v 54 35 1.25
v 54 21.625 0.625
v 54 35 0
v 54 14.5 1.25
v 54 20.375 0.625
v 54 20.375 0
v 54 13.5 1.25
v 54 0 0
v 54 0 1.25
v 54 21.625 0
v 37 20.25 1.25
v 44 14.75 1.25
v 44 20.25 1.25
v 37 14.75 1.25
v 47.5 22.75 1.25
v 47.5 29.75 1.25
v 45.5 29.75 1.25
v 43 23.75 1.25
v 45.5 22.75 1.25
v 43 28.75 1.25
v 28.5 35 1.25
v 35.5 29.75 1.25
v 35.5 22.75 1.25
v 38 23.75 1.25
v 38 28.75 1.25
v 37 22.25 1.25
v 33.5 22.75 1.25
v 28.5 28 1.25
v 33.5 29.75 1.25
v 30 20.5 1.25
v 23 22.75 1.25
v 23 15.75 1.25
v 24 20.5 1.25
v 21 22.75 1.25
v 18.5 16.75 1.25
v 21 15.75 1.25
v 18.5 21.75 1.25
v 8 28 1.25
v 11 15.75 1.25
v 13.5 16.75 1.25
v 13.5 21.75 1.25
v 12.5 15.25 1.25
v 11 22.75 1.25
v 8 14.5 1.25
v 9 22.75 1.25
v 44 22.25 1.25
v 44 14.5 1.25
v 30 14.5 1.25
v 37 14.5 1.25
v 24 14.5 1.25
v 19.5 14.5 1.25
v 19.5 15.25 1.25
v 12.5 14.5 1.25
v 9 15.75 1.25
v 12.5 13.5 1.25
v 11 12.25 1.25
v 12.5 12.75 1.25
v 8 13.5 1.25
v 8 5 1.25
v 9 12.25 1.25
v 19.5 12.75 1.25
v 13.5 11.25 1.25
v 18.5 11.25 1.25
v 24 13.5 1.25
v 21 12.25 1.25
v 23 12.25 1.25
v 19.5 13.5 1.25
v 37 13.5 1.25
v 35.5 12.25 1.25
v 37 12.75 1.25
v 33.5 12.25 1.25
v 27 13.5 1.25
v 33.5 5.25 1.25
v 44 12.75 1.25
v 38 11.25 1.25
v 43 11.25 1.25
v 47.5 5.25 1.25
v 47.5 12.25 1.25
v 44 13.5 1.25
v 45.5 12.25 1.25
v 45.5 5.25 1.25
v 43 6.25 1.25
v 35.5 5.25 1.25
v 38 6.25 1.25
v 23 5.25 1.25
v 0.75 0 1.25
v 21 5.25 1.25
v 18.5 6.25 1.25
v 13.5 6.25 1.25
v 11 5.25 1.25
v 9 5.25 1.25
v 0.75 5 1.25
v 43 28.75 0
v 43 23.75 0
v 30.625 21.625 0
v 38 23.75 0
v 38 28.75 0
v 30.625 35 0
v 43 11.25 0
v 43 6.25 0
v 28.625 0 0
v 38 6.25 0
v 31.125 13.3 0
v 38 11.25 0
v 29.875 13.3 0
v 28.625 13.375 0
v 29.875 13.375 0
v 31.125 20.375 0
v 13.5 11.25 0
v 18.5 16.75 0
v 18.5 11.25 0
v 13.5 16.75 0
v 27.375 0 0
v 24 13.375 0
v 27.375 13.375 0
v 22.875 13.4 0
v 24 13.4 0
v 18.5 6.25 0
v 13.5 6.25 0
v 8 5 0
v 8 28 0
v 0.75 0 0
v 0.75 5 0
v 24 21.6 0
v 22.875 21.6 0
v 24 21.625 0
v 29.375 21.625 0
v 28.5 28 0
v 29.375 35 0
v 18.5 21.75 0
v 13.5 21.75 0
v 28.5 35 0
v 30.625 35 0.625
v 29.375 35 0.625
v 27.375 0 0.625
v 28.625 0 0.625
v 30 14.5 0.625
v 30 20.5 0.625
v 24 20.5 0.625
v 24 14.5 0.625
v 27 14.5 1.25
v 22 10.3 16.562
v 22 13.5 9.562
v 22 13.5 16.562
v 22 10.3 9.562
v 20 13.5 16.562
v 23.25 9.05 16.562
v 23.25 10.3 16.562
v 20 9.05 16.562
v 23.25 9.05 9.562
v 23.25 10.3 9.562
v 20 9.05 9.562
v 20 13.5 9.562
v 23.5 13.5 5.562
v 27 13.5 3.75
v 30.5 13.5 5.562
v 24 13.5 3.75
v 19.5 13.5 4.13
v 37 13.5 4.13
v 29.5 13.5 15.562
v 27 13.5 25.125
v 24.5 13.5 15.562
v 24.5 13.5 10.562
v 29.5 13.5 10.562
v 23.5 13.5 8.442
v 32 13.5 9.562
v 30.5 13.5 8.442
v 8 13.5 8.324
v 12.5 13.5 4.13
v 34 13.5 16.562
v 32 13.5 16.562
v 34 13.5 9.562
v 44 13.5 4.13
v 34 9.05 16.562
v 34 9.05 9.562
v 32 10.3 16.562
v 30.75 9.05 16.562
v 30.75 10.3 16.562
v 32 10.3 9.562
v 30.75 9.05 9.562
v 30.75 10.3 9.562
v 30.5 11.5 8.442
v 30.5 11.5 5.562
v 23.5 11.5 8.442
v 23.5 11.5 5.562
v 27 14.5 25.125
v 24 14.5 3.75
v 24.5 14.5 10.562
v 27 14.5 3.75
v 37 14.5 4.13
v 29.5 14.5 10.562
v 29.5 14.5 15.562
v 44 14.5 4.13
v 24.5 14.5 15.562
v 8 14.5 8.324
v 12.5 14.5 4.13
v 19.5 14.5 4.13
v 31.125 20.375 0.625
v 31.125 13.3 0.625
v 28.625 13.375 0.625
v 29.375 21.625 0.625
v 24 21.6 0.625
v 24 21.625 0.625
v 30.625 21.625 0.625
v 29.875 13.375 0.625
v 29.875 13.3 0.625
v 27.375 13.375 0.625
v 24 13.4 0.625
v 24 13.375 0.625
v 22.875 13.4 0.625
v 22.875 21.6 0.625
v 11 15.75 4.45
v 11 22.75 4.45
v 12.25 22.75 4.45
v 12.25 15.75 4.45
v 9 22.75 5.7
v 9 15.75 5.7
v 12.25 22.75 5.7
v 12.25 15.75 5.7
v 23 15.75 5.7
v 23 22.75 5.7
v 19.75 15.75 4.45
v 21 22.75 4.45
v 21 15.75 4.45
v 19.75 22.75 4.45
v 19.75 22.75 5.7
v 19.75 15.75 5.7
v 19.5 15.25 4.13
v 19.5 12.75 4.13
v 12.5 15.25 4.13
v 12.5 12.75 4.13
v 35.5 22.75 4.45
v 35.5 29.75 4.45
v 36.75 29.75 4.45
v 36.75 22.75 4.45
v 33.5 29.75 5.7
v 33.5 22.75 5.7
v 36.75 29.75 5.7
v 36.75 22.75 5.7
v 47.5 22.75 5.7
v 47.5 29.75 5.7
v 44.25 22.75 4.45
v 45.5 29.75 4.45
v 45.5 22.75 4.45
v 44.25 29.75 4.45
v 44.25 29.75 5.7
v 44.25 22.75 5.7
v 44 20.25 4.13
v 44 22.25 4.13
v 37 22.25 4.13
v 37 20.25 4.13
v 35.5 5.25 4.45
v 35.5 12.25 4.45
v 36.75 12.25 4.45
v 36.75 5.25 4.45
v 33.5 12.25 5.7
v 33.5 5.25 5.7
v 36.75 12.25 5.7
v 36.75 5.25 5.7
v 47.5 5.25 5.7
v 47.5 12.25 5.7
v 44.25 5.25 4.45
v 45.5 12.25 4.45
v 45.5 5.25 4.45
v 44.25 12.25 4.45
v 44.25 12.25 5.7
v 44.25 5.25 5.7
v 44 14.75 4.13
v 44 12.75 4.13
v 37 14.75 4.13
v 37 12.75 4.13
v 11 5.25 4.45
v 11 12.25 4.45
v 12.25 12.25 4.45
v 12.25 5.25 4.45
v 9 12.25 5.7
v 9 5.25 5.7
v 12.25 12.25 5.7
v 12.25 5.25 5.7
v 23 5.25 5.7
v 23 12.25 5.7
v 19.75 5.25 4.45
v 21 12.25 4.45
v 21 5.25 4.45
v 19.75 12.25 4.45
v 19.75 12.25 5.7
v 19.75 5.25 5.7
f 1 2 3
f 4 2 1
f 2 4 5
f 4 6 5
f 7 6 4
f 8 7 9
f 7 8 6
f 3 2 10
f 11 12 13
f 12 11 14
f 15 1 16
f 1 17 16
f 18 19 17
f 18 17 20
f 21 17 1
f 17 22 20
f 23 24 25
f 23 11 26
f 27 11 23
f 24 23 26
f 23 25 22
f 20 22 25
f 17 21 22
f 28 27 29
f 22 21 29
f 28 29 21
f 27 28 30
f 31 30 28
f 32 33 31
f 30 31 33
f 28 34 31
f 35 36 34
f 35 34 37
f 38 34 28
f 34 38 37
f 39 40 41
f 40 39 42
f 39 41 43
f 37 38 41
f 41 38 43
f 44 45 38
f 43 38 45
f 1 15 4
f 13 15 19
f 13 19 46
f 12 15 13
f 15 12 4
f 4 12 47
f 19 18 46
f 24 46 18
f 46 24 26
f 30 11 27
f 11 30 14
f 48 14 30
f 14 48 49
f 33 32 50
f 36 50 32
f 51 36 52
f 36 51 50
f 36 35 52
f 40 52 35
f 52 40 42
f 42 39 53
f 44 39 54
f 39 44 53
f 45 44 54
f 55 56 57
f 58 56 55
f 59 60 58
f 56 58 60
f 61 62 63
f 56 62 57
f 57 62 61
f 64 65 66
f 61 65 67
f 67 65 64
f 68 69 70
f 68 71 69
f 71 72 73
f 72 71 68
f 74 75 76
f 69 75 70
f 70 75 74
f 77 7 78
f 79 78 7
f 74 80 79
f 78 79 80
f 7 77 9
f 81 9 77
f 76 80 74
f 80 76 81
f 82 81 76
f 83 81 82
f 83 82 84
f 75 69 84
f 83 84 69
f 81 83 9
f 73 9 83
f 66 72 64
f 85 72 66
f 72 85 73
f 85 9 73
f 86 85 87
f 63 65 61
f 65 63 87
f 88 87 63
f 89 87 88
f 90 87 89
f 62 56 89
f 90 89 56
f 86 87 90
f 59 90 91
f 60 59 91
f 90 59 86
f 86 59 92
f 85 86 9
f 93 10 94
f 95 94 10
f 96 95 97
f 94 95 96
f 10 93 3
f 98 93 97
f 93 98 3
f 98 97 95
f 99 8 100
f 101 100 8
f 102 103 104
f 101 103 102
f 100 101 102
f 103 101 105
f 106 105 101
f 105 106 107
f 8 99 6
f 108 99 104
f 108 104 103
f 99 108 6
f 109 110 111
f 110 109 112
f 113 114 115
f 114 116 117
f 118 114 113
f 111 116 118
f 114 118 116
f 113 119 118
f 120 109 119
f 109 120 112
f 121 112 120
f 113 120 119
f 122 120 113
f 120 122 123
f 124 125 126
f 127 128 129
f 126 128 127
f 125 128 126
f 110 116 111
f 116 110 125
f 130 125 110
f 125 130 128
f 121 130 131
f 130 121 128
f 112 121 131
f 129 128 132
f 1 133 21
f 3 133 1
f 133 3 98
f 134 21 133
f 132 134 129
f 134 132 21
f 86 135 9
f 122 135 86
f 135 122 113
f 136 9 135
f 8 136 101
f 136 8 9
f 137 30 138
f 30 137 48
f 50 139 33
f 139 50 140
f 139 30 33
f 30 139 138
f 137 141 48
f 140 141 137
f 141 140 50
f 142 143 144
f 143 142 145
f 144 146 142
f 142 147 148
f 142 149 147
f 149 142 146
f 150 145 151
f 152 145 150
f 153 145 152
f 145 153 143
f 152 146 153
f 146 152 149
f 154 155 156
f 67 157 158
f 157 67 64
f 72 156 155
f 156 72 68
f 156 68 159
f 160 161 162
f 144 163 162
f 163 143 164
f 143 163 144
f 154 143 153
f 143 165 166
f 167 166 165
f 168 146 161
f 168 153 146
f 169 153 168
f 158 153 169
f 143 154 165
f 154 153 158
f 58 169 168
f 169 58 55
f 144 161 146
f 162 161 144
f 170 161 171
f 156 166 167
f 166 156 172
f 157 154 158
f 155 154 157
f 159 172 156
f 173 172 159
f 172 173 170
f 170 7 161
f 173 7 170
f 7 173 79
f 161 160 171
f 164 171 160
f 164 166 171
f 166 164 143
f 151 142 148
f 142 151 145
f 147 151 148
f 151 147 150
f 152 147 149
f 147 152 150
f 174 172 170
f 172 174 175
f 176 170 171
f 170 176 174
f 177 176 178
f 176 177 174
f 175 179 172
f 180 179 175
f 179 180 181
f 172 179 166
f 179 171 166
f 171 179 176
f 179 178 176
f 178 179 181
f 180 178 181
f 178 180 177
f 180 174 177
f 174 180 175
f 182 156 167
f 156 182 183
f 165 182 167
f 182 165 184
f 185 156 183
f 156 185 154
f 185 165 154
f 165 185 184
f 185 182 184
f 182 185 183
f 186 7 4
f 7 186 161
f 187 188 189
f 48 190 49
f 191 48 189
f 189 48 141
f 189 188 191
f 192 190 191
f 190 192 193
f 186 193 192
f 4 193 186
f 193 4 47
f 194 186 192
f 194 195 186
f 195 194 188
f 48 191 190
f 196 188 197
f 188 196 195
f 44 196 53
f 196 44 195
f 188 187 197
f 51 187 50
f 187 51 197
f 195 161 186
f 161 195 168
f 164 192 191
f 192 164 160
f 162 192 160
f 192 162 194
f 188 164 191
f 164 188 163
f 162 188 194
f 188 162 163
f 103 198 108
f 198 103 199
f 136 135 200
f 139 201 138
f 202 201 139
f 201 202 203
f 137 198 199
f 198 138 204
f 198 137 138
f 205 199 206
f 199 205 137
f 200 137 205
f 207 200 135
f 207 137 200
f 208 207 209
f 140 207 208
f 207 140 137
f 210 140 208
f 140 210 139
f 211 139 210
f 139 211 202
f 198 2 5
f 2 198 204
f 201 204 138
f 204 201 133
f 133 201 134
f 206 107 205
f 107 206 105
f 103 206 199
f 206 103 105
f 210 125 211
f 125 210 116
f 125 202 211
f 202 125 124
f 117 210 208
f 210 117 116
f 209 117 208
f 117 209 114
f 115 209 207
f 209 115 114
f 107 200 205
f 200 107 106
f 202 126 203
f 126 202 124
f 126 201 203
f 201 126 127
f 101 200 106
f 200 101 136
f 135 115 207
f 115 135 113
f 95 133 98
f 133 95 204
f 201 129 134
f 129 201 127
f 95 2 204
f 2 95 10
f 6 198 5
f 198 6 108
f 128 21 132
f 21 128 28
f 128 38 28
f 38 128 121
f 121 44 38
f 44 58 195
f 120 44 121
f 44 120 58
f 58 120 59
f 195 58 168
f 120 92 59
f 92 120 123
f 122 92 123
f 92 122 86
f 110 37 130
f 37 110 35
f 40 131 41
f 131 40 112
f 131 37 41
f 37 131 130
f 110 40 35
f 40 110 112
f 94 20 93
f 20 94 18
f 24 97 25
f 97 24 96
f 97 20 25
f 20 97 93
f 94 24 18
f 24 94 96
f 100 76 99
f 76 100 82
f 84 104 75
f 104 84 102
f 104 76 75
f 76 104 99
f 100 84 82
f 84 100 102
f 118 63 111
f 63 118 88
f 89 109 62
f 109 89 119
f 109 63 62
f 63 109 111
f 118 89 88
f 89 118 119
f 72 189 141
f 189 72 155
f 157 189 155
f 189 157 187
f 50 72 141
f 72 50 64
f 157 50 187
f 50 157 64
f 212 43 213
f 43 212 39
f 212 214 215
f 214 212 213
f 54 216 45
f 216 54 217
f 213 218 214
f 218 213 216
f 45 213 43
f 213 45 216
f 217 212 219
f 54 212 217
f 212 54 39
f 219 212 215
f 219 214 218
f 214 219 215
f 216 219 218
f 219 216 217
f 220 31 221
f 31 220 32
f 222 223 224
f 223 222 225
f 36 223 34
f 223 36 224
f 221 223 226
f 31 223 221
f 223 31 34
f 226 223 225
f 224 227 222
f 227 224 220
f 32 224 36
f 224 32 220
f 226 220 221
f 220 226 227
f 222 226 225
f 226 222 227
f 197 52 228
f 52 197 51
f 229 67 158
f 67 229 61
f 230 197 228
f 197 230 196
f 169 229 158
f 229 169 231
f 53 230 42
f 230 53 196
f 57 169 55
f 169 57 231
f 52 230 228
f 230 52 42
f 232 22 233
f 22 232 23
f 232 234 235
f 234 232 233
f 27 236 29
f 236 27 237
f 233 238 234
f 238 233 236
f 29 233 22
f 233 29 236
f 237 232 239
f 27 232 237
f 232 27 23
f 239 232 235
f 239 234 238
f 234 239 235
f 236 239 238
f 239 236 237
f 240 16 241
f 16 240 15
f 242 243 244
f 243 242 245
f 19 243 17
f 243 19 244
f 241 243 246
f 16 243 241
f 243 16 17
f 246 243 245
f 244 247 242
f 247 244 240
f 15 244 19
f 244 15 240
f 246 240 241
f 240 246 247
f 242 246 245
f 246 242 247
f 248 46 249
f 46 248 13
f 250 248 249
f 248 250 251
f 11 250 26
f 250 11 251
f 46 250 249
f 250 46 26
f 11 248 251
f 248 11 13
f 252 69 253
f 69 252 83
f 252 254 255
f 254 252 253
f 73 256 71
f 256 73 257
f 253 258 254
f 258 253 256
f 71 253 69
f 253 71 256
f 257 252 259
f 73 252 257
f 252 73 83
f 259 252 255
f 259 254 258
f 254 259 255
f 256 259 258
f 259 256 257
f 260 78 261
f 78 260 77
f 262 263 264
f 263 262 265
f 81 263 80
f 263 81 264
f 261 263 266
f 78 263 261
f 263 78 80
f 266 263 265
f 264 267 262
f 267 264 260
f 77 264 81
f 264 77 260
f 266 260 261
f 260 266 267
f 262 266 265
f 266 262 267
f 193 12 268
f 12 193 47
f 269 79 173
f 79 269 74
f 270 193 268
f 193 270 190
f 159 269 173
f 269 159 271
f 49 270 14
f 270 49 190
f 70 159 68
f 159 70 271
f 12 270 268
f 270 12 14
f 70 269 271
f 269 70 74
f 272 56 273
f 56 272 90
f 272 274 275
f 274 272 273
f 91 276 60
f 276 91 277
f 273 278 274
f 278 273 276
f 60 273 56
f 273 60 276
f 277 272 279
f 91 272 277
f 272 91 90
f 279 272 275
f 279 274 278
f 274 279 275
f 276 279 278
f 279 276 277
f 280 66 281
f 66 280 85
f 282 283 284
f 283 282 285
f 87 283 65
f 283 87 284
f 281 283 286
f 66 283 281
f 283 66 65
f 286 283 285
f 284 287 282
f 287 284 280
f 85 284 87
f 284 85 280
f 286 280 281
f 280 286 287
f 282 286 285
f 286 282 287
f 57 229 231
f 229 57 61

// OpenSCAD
/*
Projekt Name: Trennwaende fuer das Modellhaus 3723
Modul:  Zwischendecke mit Halterungen fuer die WS2812
Projekt URL: https://github.com/Hardi-St/MobaLedLib_Docu/tree/master/3D_Daten_fuer_die_MobaLedLib/Trennwaende%20fuer%20Haeuser
Version: 0.0.1
Autor: Moba-Nick (mobanick@wp12085804.server-he.de)
Lizenz: CC-BY-SA-4.0 (https://creativecommons.org/licenses/by-sa/4.0/legalcode.de)
*/
// Alle Angaben sind immer in mm bei meinen Projekten.
//Parameter fuer die Grundplatte des Hauses
x_grund = 54;       // Laenge der Grundplatte
y_grund = 35;       // Breite der Grundplatte 
z_grund = 1.25;       // Staerke der Zwischendecke
wand_staerke = 1.00; // Parameter fuer die Staerke der Waende

z_zwischendecke = z_grund * 0.5; // Hoehe der Fugen
faktor_fugen = 1.25; //Faktor um den die Fugen breiter sind als die Wandstaerke
fugen_erstellen = true; // Sollen Fugen fuer das verkleben erstellt (true) oder keine Fugen erstellt (false) werden?

/*
    Bitte die nachfolgenden Zeilen nicht aendern. Diese errechnen die zusaetzlichen Parameter aus den vorhandenen Werten und legen die Abmessungen fuer die LED-Halterungen fest.
*/
x_all = x_grund; 
y_all = y_grund; 
z_all = 55 - 28 - z_grund - wand_staerke*0.625; // Gesamthoehe vom Haus - Hoehe_Erdgeschoss (Grundplatte_Haus.scad) - Hoehe Zwischendecke - Dachschraegenkompensierung
z_knie = 0; //Kniestock nicht vorhanden

// Variablen zu den LEDs und deren Halterung
led_x = 10; // Laenge der LED inkl. Platine
led_y = 10; // Breite der LED inkl. Platine
led_x_inner = 5; // Laenge der LED ohne Platine
led_y_inner = 5; // Breite der LEd ohne Platine
led_h_z = 3.2; // Abstand zwischen Grundplatte und LED-Haken 
led_h_x = 7; // Laenge des LED-Halters
led_h_y = 2; // Breite des LED-Halters
haken = 1.25; // BReite des Ueberhanges des LED-Halters

// Angaben fuer die Groesse der Kabeloeffnungen in den Waenden. setzen der Werte auf 0 deaktivieren die Funktion
kabel_x = 2.5;
kabel_y = 3.00;

/* 
    Wenn die Zwischendecke_Haus eine Oeffnung braucht, kann man hier einen Ausschnitt in der Zwischendecke_Haus dafuer vorsehen und die Position und Groesse angeben.
*/
x_cut = 6;  // Laenge der Aussparung
y_cut = 6;  // Breite der Aussparung
cut_pos_x = x_grund/2 - x_cut/2; // Punkt X der Aussparung
cut_pos_y = y_all/2 - y_cut/2; // Punkt Y der Aussparung 

/*
    Im nachfolgendem Abschnitt wird die Grundplatte und alle Waende erstellt.
    Die Angaben koennen ganz nach belieben abgeaendert werden.
*/
difference(){
    //Erstellen der Zwischendecke sowie dem Loch fuer den Kabelschacht (true = mit loch, false = ohne Loch)
    union(){
        Zwischendecke_Haus(true);
        DachSchraege_Y_Wand(0,y_grund/2-y_cut/2-wand_staerke,z_grund,x_grund,z_all,true);
    }
    if (fugen_erstellen == true){
         //Kabelschacht
        // rechts
        Wand_DIR_X(x_grund/2+x_cut/2+wand_staerke/2,y_grund/2-y_cut/2-wand_staerke-0.2,0,x_cut+wand_staerke*2,z_zwischendecke,faktor_fugen);
        //links
        Wand_DIR_X(x_grund/2-x_cut/2-wand_staerke/2,y_grund/2-y_cut/2-wand_staerke-0.1,0,x_cut+wand_staerke*2+0.2,z_zwischendecke,faktor_fugen);
        //vorne
        Wand_DIR_Y(x_grund/2-x_cut/2,y_grund/2-y_cut/2-wand_staerke/2,0,y_cut,z_zwischendecke,faktor_fugen);
        //hinten
        Wand_DIR_Y(x_grund/2-x_cut/2,y_grund/2+y_cut/2+wand_staerke/2,0,y_cut,z_zwischendecke,faktor_fugen);
        
        // Wand vorne bis Mitte
        Wand_DIR_X(x_grund/2+wand_staerke, 0,0,y_grund/2-y_cut/2,z_zwischendecke,faktor_fugen); 

        // Wand Mitte bis Hinten
        Wand_DIR_X(x_grund/2+3, y_grund/2+y_cut/2,0,y_grund/2-y_cut/2,z_zwischendecke,faktor_fugen);

        //Wand Mitte bis Rechts
        Wand_DIR_Y(x_grund/2+x_cut/2+wand_staerke/2,y_grund/2+y_cut/2+wand_staerke/2,0,x_grund/2-x_cut/2-wand_staerke/2,z_zwischendecke,faktor_fugen);
    }
    // Ausschnitt oben
    translate([0,y_all-7,0]){
        cube([x_grund/2+1.5,7,z_all],false);
    }
    // Ausschnitt links
    translate([0,5,0]){
        cube([8,y_all,z_all],false);
    }
        // Kappung um 1mm wegen Länge links
    translate([0,0,0]){
        cube([0.75,8,z_all],false);
    }
    // Oben Links Tuer/Schafenster 1
    LED_Loch(16, y_all*0.55); 
    // Oben Rechts Dunkelkammer
    LED_Loch(x_all*0.75, y_all*0.75); 
    // Unten Rechts Lager
    LED_Loch(x_all*0.75, y_all*0.25); 
    // Unten Links Tuer/Schafenster 2
    LED_Loch(16, y_all*0.25); 
  
    Kabel_Loch(x_grund/2-x_cut/2,y_grund/2-y_cut/2-wand_staerke);  
}

// Oben Links Tuer/Schafenster 1
LED_Halter_R(16, y_all*0.55,"unten");
// Oben Rechts Dunkelkammer
LED_Halter_R(x_all*0.75, y_all*0.75,"unten");
// Unten Rechts Lager
LED_Halter_R(x_all*0.75, y_all*0.25,"oben");
// Unten Links Tuer/Schafenster 2
LED_Halter_R(16, y_all*0.25,"oben"); 

/* 
!!!!!!!!!!!!!!!!!!!!!!!!!!!!!!!!!!!!!!!!!!!!!!!!!!!!!!!!!!!!!!!!!!!!   
!!!!    Ab hier kommen die Module. Bitte nur aendern wann man   !!!!
!!!!    weiss was man macht.                                    !!!!
!!!!!!!!!!!!!!!!!!!!!!!!!!!!!!!!!!!!!!!!!!!!!!!!!!!!!!!!!!!!!!!!!!!!
/*  
    Das Module Zwischendecke_Haus erstellt die Grundplatte des Hauses inkl. des Aussenrandes um die Grundplatte. Dazu wurde im Bereich fuer die Parameter in den  Zeilen 10 - 37 die Werte angeben.
*/
module Zwischendecke_Haus(cutting){
        difference(){
            cube([x_grund,y_grund,z_grund],false);
            // Auschnitt aus der Grundplatte vornehmen
            if (cutting == true){
                translate([cut_pos_x,cut_pos_y,0]){
                    cube([x_cut,y_cut,z_grund],false);
                }
            }
        }
}

/*
    Das Modul "Wand_DIR_X" erstellt Waende welche auf der X-Achse (von links nach rechts) verschoben werden koennen.
    pos_x   => gibt den pospunkt auf der X-Achse an.
    pos_y   => gibt den pospunkt auf der Y-Achse an.
    pos_z   => gibt den pospunkt auf der Z-Achse an.
    width_y => gibt an wie lang die Wand werden soll.
    height  => gibt die Hoehe der Wand an.
*/
module Wand_DIR_X(pos_x, pos_y, pos_z,width_x, height, faktor){
    translate([pos_x -wand_staerke*faktor/2,pos_y,pos_z]){
        cube([wand_staerke*faktor,width_x, height]);
    }
}

/*
    Das Modul "Wand_DIR_Y" erstellt Waende welche auf der Y-Achse (von vorne nach hinten) verschoben werden koennen.  
    pos_x   => gibt den pospunkt auf der X-Achse an.
    pos_y   => gibt den pospunkt auf der Y-Achse an.
    pos_z   => gibt den pospunkt auf der Z-Achse an.
    width_y => gibt an wie lang die Wand werden soll.
    height  => gibt die Hoehe der Wand an.
*/
module Wand_DIR_Y(pos_x, pos_y, pos_z,width_y,height, faktor){
    translate([pos_x,pos_y - wand_staerke*faktor/2,pos_z]){
        cube([width_y,wand_staerke*faktor, height]);
    }
}

/*
    Das Modul "LED_Loch" erstellt die Oeffnungen fuer die LEDs, damit das Licht durch die Zwischendecke in den zu beleuchtenden Raum kommt.
    pos_x   => gibt den Mittelpunkt der Oeffnung auf der X-Achse an.
    pos_y   => gibt den Mittelpunkt der Oeffnung auf der Y-Achse an.
*/
module LED_Loch(pos_x, pos_y){
    translate([pos_x - led_x_inner/2,pos_y - led_y_inner/2,0]){
        cube([led_x_inner,led_y_inner, z_grund], center=false);
    }
}

/*
    Das Modul "LED_Halter" erstellt die Halterungen fuer die LEDs.
    pos_x   => gibt den Mittelpunkt der LED auf der X-Achse an.
    pos_y   => gibt den Mittelpunkt der LED auf der Y-Achse an.
    posh    => bestimmt ob der der Einschubbegrenzer links oder rechts aus sicht der LED ist
*/
module LED_Halter(pos_x, pos_y,posh){
    translate([pos_x - led_h_x/2,pos_y - led_y/2 - led_y_inner / 2,z_grund]){
        cube([led_h_x,led_h_y,led_h_z], center=false);
    }
    translate([pos_x - led_h_x/2,pos_y - led_y/2 - led_y_inner / 2,z_grund+led_h_z]){
        cube([led_h_x,led_h_y+haken,z_grund], center=false);
    }
    translate([pos_x - led_h_x/2,pos_y + led_y/2,z_grund]){
        cube([led_h_x,led_h_y,led_h_z], center=false);
    }
    translate([pos_x - led_h_x/2,pos_y + led_y/2-haken,z_grund+led_h_z]){
        cube([led_h_x,led_h_y+haken,z_grund], center=false);
    }

    if (posh == "rechts"){
        translate([pos_x+led_x/2,pos_y-led_h_x/2,z_grund]){
            cube([led_h_y,led_h_x,led_h_z*0.9], center=false);
        }
    }else if (posh == "links"){
        translate([pos_x-led_x/2-led_h_y,pos_y-led_h_x/2,z_grund]){
            cube([led_h_y,led_h_x,led_h_z*0.9], center=false);
        }
    }else{
        // Kein Einschubbegrenzer
    }
}

/*
    Das Modul "LED_Halter_R" erstellt die Halterungen fuer die LEDs.
    pos_x   => gibt den Mittelpunkt der LED auf der X-Achse an.
    pos_y   => gibt den Mittelpunkt der LED auf der Y-Achse an.
    posh    => bestimmt ob der der Einschubbegrenzer oben oder unten aus sicht der LED ist
*/
module LED_Halter_R(pos_x, pos_y,posh){
        translate([pos_x - led_y/2-led_h_y,pos_y - led_h_y/2 - led_y_inner / 2,z_grund]){
            cube([led_h_y,led_h_x,led_h_z], center=false);
        }
        translate([pos_x - led_y/2-led_h_y,pos_y - led_h_y/2 - led_y_inner / 2,z_grund+led_h_z]){
            cube([led_h_y+haken,led_h_x,z_grund], center=false);
        }
        translate([pos_x + led_y/2,pos_y - led_h_y/2-led_y_inner / 2,z_grund]){
            cube([led_h_y,led_h_x,led_h_z], center=false);
        }
        translate([pos_x + led_y/2 - haken,pos_y - led_h_y/2-led_y_inner / 2,z_grund+led_h_z]){
            cube([led_h_y+haken,led_h_x,z_grund], center=false);
        }

        if (posh == "oben"){
            translate([pos_x-led_h_x/2,pos_y+led_y/2-led_h_y/2,z_grund]){
                cube([led_h_x,led_h_y,led_h_z*0.9], center=false);
            }
        }else{
            translate([pos_x-led_h_x/2,pos_y-led_y/2-led_h_y/2,z_grund]){
                cube([led_h_x,led_h_y,led_h_z*0.9], center=false);
            }
        }
}
/*
    Das Modul "LED_Halter_W" erstellt die Halterungen fuer die LEDs an der Mittelwand. Der Einschubbegrenzer ist dabei immer unten.
    pos_x   => gibt den Mittelpunkt der LED auf der X-Achse an.
    pos_y   => gibt den Mittelpunkt der LED auf der Y-Achse an.
    pos_z   => gibt den Mittelpunkt der LED auf der Z-Achse an.
*/
module LED_Halter_W(pos_x, pos_y,pos_z){
        translate([pos_x-led_x/2-led_h_y,pos_y-led_h_z,pos_z-led_h_y/2]){
            cube([led_h_y,led_h_z,led_h_x], center=false);
        }
        translate([pos_x-led_x/2-led_h_y,pos_y-led_h_z-z_grund,pos_z-led_h_y/2]){
            cube([led_h_y+haken,z_grund,led_h_x], center=false);
        }
        translate([pos_x+led_x/2,pos_y-led_h_z,pos_z-led_h_y/2]){
            cube([led_h_y,led_h_z,led_h_x], center=false);
        }
        translate([pos_x+led_x/2-haken,pos_y-led_h_z-z_grund,pos_z-led_h_y/2]){
            cube([led_h_y+haken,z_grund,led_h_x], center=false);
        }

        translate([pos_x-led_h_x/2, pos_y-led_h_y ,pos_z-led_y_inner]){
            cube([led_h_x,led_h_y,led_h_z*0.9], center=false);
        }
}

/*
    Das Modul "Kabel_Loch" erstellt die Oeffnungen fuer das durchfuehren der Kabel durch die Mittelwand. Die poshoehe ist dabei immer die Oberkante der Zwischendecke.
    pos_x   => gibt den Mittelpunkt der LED auf der X-Achse an.
    pos_y   => gibt den Mittelpunkt der LED auf der Y-Achse an.
*/
module Kabel_Loch(pos_x,pos_y){
    translate([pos_x,pos_y,z_grund]){
        cube([kabel_y,wand_staerke,kabel_x],false);
    }
}

/*
    Das Modul "DachSchraege" erstellt die Waende von der Aussenseite der Zwischendecke zur Mittelwand mit einer schraegen Decke und einem Kniestock.
     * Dachschraege(X,Y,Z,LED-Halterung,Pos,LED-Oeffnung,Kabeloeffnung);
     * X => posposition X-Achse
     * Y => posposition Y-Achse
     * Z => posposition Z-Achse
     * LED-Halterung => Soll die Wand eine Halterung fuer LEDs haben? => "links", "rechts", false 
     * Pos => Befindet sich die Dachschraege vor oder hinter der Mittelwand? => "vorne", "hinten"
     * LED-Oeffnung => Hat die Wand eine Oeffnung fuer eine LED? => true, false 
     * Kabel-Oeffnung => Soll die Wand eine Oeffnung fuer Kabel haben? Die Oeffnung ist immer an bei der Mittelwand. => true, false
*/
module DachSchraege(pos_x,pos_y,pos_z,pos_led,pos_wand,led_loch,kabel_loch){
    difference(){
        /* 
         *  BEGINN union()
        */
        union(){  
            /* 
             *  BEGINN KnieStock
            */
            translate([pos_x,pos_y,pos_z]){
                cube([wand_staerke,y_all/2,z_knie],false);
            }
            // ENDE KnieStock
            
            /* 
             *  BEGINN DachSchraege
             *  "vorne"  => Die Dachschraege beginnt Anfang der
             *  Zwischendecke und geht bis zur Mitte des Daches.
             *
             *  "hinten" => Die Dachschraege beginnt in der Mitte des Daches
             *  und geht bis zum Ende der Zwischendecke.
            */
            if (pos_wand == "vorne"){
                DachPunkte = [
                  [pos_x,pos_y,pos_z + z_knie],  //0
                  [pos_x + wand_staerke,pos_y,pos_z + z_knie],  //1
                  [pos_x + wand_staerke,pos_y + y_all/2,pos_z + z_knie],  //2
                  [pos_x,pos_y+y_all/2,pos_z + z_knie],  //3
                  [pos_x,pos_y+y_all/2,pos_z + z_all],  //4
                  [pos_x + wand_staerke,pos_y+y_all/2,pos_z + z_all]]; //5
                DachFlaechen = [
                    [0,1,2,3],//Boden
                    [5,4,3,2],//links
                    [0,4,5,1],//Oben
                    [5,1,0],//hinten
                    [5,2,1]];//vorne
                  
                polyhedron( DachPunkte, DachFlaechen );
            }else{
                DachPunkte = [
                  [pos_x,pos_y,pos_z + z_knie],  //0
                  [pos_x + wand_staerke,pos_y,pos_z + z_knie],  //1
                  [pos_x + wand_staerke,pos_y + y_all/2,pos_z + z_knie],  //2
                  [pos_x,pos_y+y_all/2,pos_z + z_knie],  //3
                  [pos_x,pos_y,pos_z + z_all],  //4
                  [pos_x + wand_staerke,pos_y,pos_z + z_all]]; //5
                DachFlaechen = [
                    [0,1,2,3],//Boden
                    [5,4,3,2],//links
                    [0,4,5,1],//Oben
                    [0,3,4],//hinten
                    [5,2,1]];//vorne
                  
                polyhedron( DachPunkte, DachFlaechen );
            }
            // ENDE DachSchraege
            
            /* BEGINN LED Halter an Dachschraege
            * Led_Halter_Dach(pos_x, pos_y,pos_z,dir)
            * Die pospunkte der X, Y und Z-Achse werden von den 
            * pospunkten der Wand automatisch berechnet und muessen nicht 
            * veraendert werden.
            * pos_x    => pospunkt X-Achse
            * pos_y    => pospunkt Y-Achse
            * pos_z    => pospunkt Z-Achse
            * dir      => Halterung an der linken oder rechten Seite der Wand
            */
            if (pos_led != false){
                if (pos_wand == "vorne"){
                    Led_Halter_Dach(pos_x,pos_y+y_all/2-led_y_inner-led_h_y,z_knie+led_x_inner/2,pos_led);
                }else{
                   Led_Halter_Dach(pos_x,pos_y+led_y_inner+led_h_y,z_knie+led_x_inner/2,pos_led);
                }
            }//ENDE LED Halter an Dachschraege
        }//Ende union()
        /*
         *  BEGINN difference()
         *  Alles was ab hier kommt wird aus den Flaechen oben ausgeschnitten
        */
        
        /*
        *   BEGINN LED_Loch 
        */
        if (led_loch == true){
            if (pos_wand == "vorne"){
                    translate([pos_x,pos_y+y_all/2-led_h_y-led_y/2-led_y_inner/2,z_knie+led_x_inner/2+led_h_y/2]){
                        cube([wand_staerke,led_y_inner,led_x_inner],false);
                    }
                }else{
                   translate([pos_x,pos_y+led_y_inner/2+led_h_z/2,z_knie+led_x_inner/2+led_h_y/2]){
                        cube([wand_staerke,led_y_inner,led_x_inner],false);
                    }
                }
        }
        //  ENDE LED_Loch
        
        /*
        *   BEGINN Kabel_Loch
        */
        if (kabel_loch == true){
            if (pos_wand == "vorne"){
                    translate([pos_x,pos_y+y_all/2-wand_staerke/2-kabel_y,z_grund]){
                        cube([wand_staerke,kabel_y,kabel_x],false);
                    }
                }else{
                   translate([pos_x,pos_y+wand_staerke/2,z_grund]){
                        cube([wand_staerke,kabel_y,kabel_x],false);
                    }
                }
        }
        //  ENDE Kabel_Loch
    }
}

/*
    Das Modul "LED_Halter_Dach" erstellt die Halterungen fuer die LEDs an der Mittelwand. Der Einschubbegrenzer ist dabei immer unten.
    pos_x   => gibt den Mittelpunkt der LED auf der X-Achse an.
    pos_y   => gibt den Mittelpunkt der LED auf der Y-Achse an.
    pos_z   => gibt den Mittelpunkt der LED auf der Z-Achse an.
    dir     => git an ob die Halterung links oder rechts von der Dachsraege ist.
*/
module Led_Halter_Dach(pos_x, pos_y,pos_z,dir){
    h_diff = 0;
    if (dir == "rechts"){
        translate([pos_x+wand_staerke,pos_y-led_x/2-led_h_y,pos_z]){
            cube([led_h_z-h_diff,led_h_y,led_h_x], center=false);
        }
        translate([pos_x+wand_staerke+led_h_z-h_diff,pos_y-led_x/2-led_h_y,pos_z]){
            cube([haken,led_h_y+haken,led_h_x], center=false);
        }
        
        translate([pos_x+wand_staerke,pos_y+led_x/2,pos_z]){
            cube([led_h_z-h_diff,led_h_y,led_h_x], center=false);
        }
        translate([pos_x+wand_staerke+led_h_z-h_diff,pos_y+led_x/2-haken,pos_z]){
            cube([haken,led_h_y+haken,led_h_x], center=false);
        }
        translate([pos_x+wand_staerke,pos_y-led_h_x/2,pos_z-led_h_x/2]){
            cube([led_h_y*0.9,led_h_x,led_h_y], center=false);
        }
    }else{
        translate([pos_x-led_h_z+h_diff,pos_y-led_x/2-led_h_y,pos_z]){
            cube([led_h_z-h_diff,led_h_y,led_h_x], center=false);
        }
        translate([pos_x-led_h_z-haken+h_diff,pos_y-led_x/2-led_h_y,pos_z]){
            cube([haken,led_h_y+haken,led_h_x], center=false);
        }
        
        translate([pos_x-led_h_z+h_diff,pos_y+led_x/2,pos_z]){
            cube([led_h_z-h_diff,led_h_y,led_h_x], center=false);
        }
        translate([pos_x-led_h_z+h_diff-haken,pos_y+led_x/2-haken,pos_z]){
            cube([haken,led_h_y+haken,led_h_x], center=false);
        }
        translate([pos_x-led_h_y,pos_y-led_h_x/2,pos_z-led_h_x/2]){
            cube([led_h_y*0.9,led_h_x,led_h_y], center=false);
        }
    }
}

module DachSchraege_Y_Wand(pos_x,pos_y,pos_z,width_x,height_m,led_loch){
    difference(){
        union(){  
            //Kniestock
            if (z_knie > 0){
                translate([pos_x,pos_y,pos_z]){
                    cube([width_x,wand_staerke,z_knie],false);
                }
            }
            
            //Dachschraege
            DachPunkte = [
              [pos_x,pos_y,pos_z+z_knie],  //0
              [pos_x+width_x,pos_y,pos_z+z_knie],  //1
              [pos_x+width_x,pos_y+wand_staerke,pos_z+z_knie],  //2
              [pos_x,pos_y+wand_staerke,pos_z+z_knie],  //3
              [pos_x+width_x/2,pos_y+wand_staerke,z_all],  //4
              [pos_x+width_x/2,pos_y,z_all]]; //5
              
            DachFlaechen = [
              [0,1,2,3],  // bottom
              [5,1,0],  // front
              [5,4,2,1],  // right
              [4,3,2],  // back
              [4,5,0,3]]; // left
              
            polyhedron( DachPunkte, DachFlaechen );
            
            //LED_Halter am Dach
            //Links
            LED_Halter_W(x_grund/2,pos_y,z_all/2-2);
        }
        if (led_loch == true){
           translate([x_grund/2-led_x_inner/2,pos_y,z_all/2-2]){
              cube([led_x_inner,wand_staerke,led_y_inner],false);
           } 
        }
    }   
}
